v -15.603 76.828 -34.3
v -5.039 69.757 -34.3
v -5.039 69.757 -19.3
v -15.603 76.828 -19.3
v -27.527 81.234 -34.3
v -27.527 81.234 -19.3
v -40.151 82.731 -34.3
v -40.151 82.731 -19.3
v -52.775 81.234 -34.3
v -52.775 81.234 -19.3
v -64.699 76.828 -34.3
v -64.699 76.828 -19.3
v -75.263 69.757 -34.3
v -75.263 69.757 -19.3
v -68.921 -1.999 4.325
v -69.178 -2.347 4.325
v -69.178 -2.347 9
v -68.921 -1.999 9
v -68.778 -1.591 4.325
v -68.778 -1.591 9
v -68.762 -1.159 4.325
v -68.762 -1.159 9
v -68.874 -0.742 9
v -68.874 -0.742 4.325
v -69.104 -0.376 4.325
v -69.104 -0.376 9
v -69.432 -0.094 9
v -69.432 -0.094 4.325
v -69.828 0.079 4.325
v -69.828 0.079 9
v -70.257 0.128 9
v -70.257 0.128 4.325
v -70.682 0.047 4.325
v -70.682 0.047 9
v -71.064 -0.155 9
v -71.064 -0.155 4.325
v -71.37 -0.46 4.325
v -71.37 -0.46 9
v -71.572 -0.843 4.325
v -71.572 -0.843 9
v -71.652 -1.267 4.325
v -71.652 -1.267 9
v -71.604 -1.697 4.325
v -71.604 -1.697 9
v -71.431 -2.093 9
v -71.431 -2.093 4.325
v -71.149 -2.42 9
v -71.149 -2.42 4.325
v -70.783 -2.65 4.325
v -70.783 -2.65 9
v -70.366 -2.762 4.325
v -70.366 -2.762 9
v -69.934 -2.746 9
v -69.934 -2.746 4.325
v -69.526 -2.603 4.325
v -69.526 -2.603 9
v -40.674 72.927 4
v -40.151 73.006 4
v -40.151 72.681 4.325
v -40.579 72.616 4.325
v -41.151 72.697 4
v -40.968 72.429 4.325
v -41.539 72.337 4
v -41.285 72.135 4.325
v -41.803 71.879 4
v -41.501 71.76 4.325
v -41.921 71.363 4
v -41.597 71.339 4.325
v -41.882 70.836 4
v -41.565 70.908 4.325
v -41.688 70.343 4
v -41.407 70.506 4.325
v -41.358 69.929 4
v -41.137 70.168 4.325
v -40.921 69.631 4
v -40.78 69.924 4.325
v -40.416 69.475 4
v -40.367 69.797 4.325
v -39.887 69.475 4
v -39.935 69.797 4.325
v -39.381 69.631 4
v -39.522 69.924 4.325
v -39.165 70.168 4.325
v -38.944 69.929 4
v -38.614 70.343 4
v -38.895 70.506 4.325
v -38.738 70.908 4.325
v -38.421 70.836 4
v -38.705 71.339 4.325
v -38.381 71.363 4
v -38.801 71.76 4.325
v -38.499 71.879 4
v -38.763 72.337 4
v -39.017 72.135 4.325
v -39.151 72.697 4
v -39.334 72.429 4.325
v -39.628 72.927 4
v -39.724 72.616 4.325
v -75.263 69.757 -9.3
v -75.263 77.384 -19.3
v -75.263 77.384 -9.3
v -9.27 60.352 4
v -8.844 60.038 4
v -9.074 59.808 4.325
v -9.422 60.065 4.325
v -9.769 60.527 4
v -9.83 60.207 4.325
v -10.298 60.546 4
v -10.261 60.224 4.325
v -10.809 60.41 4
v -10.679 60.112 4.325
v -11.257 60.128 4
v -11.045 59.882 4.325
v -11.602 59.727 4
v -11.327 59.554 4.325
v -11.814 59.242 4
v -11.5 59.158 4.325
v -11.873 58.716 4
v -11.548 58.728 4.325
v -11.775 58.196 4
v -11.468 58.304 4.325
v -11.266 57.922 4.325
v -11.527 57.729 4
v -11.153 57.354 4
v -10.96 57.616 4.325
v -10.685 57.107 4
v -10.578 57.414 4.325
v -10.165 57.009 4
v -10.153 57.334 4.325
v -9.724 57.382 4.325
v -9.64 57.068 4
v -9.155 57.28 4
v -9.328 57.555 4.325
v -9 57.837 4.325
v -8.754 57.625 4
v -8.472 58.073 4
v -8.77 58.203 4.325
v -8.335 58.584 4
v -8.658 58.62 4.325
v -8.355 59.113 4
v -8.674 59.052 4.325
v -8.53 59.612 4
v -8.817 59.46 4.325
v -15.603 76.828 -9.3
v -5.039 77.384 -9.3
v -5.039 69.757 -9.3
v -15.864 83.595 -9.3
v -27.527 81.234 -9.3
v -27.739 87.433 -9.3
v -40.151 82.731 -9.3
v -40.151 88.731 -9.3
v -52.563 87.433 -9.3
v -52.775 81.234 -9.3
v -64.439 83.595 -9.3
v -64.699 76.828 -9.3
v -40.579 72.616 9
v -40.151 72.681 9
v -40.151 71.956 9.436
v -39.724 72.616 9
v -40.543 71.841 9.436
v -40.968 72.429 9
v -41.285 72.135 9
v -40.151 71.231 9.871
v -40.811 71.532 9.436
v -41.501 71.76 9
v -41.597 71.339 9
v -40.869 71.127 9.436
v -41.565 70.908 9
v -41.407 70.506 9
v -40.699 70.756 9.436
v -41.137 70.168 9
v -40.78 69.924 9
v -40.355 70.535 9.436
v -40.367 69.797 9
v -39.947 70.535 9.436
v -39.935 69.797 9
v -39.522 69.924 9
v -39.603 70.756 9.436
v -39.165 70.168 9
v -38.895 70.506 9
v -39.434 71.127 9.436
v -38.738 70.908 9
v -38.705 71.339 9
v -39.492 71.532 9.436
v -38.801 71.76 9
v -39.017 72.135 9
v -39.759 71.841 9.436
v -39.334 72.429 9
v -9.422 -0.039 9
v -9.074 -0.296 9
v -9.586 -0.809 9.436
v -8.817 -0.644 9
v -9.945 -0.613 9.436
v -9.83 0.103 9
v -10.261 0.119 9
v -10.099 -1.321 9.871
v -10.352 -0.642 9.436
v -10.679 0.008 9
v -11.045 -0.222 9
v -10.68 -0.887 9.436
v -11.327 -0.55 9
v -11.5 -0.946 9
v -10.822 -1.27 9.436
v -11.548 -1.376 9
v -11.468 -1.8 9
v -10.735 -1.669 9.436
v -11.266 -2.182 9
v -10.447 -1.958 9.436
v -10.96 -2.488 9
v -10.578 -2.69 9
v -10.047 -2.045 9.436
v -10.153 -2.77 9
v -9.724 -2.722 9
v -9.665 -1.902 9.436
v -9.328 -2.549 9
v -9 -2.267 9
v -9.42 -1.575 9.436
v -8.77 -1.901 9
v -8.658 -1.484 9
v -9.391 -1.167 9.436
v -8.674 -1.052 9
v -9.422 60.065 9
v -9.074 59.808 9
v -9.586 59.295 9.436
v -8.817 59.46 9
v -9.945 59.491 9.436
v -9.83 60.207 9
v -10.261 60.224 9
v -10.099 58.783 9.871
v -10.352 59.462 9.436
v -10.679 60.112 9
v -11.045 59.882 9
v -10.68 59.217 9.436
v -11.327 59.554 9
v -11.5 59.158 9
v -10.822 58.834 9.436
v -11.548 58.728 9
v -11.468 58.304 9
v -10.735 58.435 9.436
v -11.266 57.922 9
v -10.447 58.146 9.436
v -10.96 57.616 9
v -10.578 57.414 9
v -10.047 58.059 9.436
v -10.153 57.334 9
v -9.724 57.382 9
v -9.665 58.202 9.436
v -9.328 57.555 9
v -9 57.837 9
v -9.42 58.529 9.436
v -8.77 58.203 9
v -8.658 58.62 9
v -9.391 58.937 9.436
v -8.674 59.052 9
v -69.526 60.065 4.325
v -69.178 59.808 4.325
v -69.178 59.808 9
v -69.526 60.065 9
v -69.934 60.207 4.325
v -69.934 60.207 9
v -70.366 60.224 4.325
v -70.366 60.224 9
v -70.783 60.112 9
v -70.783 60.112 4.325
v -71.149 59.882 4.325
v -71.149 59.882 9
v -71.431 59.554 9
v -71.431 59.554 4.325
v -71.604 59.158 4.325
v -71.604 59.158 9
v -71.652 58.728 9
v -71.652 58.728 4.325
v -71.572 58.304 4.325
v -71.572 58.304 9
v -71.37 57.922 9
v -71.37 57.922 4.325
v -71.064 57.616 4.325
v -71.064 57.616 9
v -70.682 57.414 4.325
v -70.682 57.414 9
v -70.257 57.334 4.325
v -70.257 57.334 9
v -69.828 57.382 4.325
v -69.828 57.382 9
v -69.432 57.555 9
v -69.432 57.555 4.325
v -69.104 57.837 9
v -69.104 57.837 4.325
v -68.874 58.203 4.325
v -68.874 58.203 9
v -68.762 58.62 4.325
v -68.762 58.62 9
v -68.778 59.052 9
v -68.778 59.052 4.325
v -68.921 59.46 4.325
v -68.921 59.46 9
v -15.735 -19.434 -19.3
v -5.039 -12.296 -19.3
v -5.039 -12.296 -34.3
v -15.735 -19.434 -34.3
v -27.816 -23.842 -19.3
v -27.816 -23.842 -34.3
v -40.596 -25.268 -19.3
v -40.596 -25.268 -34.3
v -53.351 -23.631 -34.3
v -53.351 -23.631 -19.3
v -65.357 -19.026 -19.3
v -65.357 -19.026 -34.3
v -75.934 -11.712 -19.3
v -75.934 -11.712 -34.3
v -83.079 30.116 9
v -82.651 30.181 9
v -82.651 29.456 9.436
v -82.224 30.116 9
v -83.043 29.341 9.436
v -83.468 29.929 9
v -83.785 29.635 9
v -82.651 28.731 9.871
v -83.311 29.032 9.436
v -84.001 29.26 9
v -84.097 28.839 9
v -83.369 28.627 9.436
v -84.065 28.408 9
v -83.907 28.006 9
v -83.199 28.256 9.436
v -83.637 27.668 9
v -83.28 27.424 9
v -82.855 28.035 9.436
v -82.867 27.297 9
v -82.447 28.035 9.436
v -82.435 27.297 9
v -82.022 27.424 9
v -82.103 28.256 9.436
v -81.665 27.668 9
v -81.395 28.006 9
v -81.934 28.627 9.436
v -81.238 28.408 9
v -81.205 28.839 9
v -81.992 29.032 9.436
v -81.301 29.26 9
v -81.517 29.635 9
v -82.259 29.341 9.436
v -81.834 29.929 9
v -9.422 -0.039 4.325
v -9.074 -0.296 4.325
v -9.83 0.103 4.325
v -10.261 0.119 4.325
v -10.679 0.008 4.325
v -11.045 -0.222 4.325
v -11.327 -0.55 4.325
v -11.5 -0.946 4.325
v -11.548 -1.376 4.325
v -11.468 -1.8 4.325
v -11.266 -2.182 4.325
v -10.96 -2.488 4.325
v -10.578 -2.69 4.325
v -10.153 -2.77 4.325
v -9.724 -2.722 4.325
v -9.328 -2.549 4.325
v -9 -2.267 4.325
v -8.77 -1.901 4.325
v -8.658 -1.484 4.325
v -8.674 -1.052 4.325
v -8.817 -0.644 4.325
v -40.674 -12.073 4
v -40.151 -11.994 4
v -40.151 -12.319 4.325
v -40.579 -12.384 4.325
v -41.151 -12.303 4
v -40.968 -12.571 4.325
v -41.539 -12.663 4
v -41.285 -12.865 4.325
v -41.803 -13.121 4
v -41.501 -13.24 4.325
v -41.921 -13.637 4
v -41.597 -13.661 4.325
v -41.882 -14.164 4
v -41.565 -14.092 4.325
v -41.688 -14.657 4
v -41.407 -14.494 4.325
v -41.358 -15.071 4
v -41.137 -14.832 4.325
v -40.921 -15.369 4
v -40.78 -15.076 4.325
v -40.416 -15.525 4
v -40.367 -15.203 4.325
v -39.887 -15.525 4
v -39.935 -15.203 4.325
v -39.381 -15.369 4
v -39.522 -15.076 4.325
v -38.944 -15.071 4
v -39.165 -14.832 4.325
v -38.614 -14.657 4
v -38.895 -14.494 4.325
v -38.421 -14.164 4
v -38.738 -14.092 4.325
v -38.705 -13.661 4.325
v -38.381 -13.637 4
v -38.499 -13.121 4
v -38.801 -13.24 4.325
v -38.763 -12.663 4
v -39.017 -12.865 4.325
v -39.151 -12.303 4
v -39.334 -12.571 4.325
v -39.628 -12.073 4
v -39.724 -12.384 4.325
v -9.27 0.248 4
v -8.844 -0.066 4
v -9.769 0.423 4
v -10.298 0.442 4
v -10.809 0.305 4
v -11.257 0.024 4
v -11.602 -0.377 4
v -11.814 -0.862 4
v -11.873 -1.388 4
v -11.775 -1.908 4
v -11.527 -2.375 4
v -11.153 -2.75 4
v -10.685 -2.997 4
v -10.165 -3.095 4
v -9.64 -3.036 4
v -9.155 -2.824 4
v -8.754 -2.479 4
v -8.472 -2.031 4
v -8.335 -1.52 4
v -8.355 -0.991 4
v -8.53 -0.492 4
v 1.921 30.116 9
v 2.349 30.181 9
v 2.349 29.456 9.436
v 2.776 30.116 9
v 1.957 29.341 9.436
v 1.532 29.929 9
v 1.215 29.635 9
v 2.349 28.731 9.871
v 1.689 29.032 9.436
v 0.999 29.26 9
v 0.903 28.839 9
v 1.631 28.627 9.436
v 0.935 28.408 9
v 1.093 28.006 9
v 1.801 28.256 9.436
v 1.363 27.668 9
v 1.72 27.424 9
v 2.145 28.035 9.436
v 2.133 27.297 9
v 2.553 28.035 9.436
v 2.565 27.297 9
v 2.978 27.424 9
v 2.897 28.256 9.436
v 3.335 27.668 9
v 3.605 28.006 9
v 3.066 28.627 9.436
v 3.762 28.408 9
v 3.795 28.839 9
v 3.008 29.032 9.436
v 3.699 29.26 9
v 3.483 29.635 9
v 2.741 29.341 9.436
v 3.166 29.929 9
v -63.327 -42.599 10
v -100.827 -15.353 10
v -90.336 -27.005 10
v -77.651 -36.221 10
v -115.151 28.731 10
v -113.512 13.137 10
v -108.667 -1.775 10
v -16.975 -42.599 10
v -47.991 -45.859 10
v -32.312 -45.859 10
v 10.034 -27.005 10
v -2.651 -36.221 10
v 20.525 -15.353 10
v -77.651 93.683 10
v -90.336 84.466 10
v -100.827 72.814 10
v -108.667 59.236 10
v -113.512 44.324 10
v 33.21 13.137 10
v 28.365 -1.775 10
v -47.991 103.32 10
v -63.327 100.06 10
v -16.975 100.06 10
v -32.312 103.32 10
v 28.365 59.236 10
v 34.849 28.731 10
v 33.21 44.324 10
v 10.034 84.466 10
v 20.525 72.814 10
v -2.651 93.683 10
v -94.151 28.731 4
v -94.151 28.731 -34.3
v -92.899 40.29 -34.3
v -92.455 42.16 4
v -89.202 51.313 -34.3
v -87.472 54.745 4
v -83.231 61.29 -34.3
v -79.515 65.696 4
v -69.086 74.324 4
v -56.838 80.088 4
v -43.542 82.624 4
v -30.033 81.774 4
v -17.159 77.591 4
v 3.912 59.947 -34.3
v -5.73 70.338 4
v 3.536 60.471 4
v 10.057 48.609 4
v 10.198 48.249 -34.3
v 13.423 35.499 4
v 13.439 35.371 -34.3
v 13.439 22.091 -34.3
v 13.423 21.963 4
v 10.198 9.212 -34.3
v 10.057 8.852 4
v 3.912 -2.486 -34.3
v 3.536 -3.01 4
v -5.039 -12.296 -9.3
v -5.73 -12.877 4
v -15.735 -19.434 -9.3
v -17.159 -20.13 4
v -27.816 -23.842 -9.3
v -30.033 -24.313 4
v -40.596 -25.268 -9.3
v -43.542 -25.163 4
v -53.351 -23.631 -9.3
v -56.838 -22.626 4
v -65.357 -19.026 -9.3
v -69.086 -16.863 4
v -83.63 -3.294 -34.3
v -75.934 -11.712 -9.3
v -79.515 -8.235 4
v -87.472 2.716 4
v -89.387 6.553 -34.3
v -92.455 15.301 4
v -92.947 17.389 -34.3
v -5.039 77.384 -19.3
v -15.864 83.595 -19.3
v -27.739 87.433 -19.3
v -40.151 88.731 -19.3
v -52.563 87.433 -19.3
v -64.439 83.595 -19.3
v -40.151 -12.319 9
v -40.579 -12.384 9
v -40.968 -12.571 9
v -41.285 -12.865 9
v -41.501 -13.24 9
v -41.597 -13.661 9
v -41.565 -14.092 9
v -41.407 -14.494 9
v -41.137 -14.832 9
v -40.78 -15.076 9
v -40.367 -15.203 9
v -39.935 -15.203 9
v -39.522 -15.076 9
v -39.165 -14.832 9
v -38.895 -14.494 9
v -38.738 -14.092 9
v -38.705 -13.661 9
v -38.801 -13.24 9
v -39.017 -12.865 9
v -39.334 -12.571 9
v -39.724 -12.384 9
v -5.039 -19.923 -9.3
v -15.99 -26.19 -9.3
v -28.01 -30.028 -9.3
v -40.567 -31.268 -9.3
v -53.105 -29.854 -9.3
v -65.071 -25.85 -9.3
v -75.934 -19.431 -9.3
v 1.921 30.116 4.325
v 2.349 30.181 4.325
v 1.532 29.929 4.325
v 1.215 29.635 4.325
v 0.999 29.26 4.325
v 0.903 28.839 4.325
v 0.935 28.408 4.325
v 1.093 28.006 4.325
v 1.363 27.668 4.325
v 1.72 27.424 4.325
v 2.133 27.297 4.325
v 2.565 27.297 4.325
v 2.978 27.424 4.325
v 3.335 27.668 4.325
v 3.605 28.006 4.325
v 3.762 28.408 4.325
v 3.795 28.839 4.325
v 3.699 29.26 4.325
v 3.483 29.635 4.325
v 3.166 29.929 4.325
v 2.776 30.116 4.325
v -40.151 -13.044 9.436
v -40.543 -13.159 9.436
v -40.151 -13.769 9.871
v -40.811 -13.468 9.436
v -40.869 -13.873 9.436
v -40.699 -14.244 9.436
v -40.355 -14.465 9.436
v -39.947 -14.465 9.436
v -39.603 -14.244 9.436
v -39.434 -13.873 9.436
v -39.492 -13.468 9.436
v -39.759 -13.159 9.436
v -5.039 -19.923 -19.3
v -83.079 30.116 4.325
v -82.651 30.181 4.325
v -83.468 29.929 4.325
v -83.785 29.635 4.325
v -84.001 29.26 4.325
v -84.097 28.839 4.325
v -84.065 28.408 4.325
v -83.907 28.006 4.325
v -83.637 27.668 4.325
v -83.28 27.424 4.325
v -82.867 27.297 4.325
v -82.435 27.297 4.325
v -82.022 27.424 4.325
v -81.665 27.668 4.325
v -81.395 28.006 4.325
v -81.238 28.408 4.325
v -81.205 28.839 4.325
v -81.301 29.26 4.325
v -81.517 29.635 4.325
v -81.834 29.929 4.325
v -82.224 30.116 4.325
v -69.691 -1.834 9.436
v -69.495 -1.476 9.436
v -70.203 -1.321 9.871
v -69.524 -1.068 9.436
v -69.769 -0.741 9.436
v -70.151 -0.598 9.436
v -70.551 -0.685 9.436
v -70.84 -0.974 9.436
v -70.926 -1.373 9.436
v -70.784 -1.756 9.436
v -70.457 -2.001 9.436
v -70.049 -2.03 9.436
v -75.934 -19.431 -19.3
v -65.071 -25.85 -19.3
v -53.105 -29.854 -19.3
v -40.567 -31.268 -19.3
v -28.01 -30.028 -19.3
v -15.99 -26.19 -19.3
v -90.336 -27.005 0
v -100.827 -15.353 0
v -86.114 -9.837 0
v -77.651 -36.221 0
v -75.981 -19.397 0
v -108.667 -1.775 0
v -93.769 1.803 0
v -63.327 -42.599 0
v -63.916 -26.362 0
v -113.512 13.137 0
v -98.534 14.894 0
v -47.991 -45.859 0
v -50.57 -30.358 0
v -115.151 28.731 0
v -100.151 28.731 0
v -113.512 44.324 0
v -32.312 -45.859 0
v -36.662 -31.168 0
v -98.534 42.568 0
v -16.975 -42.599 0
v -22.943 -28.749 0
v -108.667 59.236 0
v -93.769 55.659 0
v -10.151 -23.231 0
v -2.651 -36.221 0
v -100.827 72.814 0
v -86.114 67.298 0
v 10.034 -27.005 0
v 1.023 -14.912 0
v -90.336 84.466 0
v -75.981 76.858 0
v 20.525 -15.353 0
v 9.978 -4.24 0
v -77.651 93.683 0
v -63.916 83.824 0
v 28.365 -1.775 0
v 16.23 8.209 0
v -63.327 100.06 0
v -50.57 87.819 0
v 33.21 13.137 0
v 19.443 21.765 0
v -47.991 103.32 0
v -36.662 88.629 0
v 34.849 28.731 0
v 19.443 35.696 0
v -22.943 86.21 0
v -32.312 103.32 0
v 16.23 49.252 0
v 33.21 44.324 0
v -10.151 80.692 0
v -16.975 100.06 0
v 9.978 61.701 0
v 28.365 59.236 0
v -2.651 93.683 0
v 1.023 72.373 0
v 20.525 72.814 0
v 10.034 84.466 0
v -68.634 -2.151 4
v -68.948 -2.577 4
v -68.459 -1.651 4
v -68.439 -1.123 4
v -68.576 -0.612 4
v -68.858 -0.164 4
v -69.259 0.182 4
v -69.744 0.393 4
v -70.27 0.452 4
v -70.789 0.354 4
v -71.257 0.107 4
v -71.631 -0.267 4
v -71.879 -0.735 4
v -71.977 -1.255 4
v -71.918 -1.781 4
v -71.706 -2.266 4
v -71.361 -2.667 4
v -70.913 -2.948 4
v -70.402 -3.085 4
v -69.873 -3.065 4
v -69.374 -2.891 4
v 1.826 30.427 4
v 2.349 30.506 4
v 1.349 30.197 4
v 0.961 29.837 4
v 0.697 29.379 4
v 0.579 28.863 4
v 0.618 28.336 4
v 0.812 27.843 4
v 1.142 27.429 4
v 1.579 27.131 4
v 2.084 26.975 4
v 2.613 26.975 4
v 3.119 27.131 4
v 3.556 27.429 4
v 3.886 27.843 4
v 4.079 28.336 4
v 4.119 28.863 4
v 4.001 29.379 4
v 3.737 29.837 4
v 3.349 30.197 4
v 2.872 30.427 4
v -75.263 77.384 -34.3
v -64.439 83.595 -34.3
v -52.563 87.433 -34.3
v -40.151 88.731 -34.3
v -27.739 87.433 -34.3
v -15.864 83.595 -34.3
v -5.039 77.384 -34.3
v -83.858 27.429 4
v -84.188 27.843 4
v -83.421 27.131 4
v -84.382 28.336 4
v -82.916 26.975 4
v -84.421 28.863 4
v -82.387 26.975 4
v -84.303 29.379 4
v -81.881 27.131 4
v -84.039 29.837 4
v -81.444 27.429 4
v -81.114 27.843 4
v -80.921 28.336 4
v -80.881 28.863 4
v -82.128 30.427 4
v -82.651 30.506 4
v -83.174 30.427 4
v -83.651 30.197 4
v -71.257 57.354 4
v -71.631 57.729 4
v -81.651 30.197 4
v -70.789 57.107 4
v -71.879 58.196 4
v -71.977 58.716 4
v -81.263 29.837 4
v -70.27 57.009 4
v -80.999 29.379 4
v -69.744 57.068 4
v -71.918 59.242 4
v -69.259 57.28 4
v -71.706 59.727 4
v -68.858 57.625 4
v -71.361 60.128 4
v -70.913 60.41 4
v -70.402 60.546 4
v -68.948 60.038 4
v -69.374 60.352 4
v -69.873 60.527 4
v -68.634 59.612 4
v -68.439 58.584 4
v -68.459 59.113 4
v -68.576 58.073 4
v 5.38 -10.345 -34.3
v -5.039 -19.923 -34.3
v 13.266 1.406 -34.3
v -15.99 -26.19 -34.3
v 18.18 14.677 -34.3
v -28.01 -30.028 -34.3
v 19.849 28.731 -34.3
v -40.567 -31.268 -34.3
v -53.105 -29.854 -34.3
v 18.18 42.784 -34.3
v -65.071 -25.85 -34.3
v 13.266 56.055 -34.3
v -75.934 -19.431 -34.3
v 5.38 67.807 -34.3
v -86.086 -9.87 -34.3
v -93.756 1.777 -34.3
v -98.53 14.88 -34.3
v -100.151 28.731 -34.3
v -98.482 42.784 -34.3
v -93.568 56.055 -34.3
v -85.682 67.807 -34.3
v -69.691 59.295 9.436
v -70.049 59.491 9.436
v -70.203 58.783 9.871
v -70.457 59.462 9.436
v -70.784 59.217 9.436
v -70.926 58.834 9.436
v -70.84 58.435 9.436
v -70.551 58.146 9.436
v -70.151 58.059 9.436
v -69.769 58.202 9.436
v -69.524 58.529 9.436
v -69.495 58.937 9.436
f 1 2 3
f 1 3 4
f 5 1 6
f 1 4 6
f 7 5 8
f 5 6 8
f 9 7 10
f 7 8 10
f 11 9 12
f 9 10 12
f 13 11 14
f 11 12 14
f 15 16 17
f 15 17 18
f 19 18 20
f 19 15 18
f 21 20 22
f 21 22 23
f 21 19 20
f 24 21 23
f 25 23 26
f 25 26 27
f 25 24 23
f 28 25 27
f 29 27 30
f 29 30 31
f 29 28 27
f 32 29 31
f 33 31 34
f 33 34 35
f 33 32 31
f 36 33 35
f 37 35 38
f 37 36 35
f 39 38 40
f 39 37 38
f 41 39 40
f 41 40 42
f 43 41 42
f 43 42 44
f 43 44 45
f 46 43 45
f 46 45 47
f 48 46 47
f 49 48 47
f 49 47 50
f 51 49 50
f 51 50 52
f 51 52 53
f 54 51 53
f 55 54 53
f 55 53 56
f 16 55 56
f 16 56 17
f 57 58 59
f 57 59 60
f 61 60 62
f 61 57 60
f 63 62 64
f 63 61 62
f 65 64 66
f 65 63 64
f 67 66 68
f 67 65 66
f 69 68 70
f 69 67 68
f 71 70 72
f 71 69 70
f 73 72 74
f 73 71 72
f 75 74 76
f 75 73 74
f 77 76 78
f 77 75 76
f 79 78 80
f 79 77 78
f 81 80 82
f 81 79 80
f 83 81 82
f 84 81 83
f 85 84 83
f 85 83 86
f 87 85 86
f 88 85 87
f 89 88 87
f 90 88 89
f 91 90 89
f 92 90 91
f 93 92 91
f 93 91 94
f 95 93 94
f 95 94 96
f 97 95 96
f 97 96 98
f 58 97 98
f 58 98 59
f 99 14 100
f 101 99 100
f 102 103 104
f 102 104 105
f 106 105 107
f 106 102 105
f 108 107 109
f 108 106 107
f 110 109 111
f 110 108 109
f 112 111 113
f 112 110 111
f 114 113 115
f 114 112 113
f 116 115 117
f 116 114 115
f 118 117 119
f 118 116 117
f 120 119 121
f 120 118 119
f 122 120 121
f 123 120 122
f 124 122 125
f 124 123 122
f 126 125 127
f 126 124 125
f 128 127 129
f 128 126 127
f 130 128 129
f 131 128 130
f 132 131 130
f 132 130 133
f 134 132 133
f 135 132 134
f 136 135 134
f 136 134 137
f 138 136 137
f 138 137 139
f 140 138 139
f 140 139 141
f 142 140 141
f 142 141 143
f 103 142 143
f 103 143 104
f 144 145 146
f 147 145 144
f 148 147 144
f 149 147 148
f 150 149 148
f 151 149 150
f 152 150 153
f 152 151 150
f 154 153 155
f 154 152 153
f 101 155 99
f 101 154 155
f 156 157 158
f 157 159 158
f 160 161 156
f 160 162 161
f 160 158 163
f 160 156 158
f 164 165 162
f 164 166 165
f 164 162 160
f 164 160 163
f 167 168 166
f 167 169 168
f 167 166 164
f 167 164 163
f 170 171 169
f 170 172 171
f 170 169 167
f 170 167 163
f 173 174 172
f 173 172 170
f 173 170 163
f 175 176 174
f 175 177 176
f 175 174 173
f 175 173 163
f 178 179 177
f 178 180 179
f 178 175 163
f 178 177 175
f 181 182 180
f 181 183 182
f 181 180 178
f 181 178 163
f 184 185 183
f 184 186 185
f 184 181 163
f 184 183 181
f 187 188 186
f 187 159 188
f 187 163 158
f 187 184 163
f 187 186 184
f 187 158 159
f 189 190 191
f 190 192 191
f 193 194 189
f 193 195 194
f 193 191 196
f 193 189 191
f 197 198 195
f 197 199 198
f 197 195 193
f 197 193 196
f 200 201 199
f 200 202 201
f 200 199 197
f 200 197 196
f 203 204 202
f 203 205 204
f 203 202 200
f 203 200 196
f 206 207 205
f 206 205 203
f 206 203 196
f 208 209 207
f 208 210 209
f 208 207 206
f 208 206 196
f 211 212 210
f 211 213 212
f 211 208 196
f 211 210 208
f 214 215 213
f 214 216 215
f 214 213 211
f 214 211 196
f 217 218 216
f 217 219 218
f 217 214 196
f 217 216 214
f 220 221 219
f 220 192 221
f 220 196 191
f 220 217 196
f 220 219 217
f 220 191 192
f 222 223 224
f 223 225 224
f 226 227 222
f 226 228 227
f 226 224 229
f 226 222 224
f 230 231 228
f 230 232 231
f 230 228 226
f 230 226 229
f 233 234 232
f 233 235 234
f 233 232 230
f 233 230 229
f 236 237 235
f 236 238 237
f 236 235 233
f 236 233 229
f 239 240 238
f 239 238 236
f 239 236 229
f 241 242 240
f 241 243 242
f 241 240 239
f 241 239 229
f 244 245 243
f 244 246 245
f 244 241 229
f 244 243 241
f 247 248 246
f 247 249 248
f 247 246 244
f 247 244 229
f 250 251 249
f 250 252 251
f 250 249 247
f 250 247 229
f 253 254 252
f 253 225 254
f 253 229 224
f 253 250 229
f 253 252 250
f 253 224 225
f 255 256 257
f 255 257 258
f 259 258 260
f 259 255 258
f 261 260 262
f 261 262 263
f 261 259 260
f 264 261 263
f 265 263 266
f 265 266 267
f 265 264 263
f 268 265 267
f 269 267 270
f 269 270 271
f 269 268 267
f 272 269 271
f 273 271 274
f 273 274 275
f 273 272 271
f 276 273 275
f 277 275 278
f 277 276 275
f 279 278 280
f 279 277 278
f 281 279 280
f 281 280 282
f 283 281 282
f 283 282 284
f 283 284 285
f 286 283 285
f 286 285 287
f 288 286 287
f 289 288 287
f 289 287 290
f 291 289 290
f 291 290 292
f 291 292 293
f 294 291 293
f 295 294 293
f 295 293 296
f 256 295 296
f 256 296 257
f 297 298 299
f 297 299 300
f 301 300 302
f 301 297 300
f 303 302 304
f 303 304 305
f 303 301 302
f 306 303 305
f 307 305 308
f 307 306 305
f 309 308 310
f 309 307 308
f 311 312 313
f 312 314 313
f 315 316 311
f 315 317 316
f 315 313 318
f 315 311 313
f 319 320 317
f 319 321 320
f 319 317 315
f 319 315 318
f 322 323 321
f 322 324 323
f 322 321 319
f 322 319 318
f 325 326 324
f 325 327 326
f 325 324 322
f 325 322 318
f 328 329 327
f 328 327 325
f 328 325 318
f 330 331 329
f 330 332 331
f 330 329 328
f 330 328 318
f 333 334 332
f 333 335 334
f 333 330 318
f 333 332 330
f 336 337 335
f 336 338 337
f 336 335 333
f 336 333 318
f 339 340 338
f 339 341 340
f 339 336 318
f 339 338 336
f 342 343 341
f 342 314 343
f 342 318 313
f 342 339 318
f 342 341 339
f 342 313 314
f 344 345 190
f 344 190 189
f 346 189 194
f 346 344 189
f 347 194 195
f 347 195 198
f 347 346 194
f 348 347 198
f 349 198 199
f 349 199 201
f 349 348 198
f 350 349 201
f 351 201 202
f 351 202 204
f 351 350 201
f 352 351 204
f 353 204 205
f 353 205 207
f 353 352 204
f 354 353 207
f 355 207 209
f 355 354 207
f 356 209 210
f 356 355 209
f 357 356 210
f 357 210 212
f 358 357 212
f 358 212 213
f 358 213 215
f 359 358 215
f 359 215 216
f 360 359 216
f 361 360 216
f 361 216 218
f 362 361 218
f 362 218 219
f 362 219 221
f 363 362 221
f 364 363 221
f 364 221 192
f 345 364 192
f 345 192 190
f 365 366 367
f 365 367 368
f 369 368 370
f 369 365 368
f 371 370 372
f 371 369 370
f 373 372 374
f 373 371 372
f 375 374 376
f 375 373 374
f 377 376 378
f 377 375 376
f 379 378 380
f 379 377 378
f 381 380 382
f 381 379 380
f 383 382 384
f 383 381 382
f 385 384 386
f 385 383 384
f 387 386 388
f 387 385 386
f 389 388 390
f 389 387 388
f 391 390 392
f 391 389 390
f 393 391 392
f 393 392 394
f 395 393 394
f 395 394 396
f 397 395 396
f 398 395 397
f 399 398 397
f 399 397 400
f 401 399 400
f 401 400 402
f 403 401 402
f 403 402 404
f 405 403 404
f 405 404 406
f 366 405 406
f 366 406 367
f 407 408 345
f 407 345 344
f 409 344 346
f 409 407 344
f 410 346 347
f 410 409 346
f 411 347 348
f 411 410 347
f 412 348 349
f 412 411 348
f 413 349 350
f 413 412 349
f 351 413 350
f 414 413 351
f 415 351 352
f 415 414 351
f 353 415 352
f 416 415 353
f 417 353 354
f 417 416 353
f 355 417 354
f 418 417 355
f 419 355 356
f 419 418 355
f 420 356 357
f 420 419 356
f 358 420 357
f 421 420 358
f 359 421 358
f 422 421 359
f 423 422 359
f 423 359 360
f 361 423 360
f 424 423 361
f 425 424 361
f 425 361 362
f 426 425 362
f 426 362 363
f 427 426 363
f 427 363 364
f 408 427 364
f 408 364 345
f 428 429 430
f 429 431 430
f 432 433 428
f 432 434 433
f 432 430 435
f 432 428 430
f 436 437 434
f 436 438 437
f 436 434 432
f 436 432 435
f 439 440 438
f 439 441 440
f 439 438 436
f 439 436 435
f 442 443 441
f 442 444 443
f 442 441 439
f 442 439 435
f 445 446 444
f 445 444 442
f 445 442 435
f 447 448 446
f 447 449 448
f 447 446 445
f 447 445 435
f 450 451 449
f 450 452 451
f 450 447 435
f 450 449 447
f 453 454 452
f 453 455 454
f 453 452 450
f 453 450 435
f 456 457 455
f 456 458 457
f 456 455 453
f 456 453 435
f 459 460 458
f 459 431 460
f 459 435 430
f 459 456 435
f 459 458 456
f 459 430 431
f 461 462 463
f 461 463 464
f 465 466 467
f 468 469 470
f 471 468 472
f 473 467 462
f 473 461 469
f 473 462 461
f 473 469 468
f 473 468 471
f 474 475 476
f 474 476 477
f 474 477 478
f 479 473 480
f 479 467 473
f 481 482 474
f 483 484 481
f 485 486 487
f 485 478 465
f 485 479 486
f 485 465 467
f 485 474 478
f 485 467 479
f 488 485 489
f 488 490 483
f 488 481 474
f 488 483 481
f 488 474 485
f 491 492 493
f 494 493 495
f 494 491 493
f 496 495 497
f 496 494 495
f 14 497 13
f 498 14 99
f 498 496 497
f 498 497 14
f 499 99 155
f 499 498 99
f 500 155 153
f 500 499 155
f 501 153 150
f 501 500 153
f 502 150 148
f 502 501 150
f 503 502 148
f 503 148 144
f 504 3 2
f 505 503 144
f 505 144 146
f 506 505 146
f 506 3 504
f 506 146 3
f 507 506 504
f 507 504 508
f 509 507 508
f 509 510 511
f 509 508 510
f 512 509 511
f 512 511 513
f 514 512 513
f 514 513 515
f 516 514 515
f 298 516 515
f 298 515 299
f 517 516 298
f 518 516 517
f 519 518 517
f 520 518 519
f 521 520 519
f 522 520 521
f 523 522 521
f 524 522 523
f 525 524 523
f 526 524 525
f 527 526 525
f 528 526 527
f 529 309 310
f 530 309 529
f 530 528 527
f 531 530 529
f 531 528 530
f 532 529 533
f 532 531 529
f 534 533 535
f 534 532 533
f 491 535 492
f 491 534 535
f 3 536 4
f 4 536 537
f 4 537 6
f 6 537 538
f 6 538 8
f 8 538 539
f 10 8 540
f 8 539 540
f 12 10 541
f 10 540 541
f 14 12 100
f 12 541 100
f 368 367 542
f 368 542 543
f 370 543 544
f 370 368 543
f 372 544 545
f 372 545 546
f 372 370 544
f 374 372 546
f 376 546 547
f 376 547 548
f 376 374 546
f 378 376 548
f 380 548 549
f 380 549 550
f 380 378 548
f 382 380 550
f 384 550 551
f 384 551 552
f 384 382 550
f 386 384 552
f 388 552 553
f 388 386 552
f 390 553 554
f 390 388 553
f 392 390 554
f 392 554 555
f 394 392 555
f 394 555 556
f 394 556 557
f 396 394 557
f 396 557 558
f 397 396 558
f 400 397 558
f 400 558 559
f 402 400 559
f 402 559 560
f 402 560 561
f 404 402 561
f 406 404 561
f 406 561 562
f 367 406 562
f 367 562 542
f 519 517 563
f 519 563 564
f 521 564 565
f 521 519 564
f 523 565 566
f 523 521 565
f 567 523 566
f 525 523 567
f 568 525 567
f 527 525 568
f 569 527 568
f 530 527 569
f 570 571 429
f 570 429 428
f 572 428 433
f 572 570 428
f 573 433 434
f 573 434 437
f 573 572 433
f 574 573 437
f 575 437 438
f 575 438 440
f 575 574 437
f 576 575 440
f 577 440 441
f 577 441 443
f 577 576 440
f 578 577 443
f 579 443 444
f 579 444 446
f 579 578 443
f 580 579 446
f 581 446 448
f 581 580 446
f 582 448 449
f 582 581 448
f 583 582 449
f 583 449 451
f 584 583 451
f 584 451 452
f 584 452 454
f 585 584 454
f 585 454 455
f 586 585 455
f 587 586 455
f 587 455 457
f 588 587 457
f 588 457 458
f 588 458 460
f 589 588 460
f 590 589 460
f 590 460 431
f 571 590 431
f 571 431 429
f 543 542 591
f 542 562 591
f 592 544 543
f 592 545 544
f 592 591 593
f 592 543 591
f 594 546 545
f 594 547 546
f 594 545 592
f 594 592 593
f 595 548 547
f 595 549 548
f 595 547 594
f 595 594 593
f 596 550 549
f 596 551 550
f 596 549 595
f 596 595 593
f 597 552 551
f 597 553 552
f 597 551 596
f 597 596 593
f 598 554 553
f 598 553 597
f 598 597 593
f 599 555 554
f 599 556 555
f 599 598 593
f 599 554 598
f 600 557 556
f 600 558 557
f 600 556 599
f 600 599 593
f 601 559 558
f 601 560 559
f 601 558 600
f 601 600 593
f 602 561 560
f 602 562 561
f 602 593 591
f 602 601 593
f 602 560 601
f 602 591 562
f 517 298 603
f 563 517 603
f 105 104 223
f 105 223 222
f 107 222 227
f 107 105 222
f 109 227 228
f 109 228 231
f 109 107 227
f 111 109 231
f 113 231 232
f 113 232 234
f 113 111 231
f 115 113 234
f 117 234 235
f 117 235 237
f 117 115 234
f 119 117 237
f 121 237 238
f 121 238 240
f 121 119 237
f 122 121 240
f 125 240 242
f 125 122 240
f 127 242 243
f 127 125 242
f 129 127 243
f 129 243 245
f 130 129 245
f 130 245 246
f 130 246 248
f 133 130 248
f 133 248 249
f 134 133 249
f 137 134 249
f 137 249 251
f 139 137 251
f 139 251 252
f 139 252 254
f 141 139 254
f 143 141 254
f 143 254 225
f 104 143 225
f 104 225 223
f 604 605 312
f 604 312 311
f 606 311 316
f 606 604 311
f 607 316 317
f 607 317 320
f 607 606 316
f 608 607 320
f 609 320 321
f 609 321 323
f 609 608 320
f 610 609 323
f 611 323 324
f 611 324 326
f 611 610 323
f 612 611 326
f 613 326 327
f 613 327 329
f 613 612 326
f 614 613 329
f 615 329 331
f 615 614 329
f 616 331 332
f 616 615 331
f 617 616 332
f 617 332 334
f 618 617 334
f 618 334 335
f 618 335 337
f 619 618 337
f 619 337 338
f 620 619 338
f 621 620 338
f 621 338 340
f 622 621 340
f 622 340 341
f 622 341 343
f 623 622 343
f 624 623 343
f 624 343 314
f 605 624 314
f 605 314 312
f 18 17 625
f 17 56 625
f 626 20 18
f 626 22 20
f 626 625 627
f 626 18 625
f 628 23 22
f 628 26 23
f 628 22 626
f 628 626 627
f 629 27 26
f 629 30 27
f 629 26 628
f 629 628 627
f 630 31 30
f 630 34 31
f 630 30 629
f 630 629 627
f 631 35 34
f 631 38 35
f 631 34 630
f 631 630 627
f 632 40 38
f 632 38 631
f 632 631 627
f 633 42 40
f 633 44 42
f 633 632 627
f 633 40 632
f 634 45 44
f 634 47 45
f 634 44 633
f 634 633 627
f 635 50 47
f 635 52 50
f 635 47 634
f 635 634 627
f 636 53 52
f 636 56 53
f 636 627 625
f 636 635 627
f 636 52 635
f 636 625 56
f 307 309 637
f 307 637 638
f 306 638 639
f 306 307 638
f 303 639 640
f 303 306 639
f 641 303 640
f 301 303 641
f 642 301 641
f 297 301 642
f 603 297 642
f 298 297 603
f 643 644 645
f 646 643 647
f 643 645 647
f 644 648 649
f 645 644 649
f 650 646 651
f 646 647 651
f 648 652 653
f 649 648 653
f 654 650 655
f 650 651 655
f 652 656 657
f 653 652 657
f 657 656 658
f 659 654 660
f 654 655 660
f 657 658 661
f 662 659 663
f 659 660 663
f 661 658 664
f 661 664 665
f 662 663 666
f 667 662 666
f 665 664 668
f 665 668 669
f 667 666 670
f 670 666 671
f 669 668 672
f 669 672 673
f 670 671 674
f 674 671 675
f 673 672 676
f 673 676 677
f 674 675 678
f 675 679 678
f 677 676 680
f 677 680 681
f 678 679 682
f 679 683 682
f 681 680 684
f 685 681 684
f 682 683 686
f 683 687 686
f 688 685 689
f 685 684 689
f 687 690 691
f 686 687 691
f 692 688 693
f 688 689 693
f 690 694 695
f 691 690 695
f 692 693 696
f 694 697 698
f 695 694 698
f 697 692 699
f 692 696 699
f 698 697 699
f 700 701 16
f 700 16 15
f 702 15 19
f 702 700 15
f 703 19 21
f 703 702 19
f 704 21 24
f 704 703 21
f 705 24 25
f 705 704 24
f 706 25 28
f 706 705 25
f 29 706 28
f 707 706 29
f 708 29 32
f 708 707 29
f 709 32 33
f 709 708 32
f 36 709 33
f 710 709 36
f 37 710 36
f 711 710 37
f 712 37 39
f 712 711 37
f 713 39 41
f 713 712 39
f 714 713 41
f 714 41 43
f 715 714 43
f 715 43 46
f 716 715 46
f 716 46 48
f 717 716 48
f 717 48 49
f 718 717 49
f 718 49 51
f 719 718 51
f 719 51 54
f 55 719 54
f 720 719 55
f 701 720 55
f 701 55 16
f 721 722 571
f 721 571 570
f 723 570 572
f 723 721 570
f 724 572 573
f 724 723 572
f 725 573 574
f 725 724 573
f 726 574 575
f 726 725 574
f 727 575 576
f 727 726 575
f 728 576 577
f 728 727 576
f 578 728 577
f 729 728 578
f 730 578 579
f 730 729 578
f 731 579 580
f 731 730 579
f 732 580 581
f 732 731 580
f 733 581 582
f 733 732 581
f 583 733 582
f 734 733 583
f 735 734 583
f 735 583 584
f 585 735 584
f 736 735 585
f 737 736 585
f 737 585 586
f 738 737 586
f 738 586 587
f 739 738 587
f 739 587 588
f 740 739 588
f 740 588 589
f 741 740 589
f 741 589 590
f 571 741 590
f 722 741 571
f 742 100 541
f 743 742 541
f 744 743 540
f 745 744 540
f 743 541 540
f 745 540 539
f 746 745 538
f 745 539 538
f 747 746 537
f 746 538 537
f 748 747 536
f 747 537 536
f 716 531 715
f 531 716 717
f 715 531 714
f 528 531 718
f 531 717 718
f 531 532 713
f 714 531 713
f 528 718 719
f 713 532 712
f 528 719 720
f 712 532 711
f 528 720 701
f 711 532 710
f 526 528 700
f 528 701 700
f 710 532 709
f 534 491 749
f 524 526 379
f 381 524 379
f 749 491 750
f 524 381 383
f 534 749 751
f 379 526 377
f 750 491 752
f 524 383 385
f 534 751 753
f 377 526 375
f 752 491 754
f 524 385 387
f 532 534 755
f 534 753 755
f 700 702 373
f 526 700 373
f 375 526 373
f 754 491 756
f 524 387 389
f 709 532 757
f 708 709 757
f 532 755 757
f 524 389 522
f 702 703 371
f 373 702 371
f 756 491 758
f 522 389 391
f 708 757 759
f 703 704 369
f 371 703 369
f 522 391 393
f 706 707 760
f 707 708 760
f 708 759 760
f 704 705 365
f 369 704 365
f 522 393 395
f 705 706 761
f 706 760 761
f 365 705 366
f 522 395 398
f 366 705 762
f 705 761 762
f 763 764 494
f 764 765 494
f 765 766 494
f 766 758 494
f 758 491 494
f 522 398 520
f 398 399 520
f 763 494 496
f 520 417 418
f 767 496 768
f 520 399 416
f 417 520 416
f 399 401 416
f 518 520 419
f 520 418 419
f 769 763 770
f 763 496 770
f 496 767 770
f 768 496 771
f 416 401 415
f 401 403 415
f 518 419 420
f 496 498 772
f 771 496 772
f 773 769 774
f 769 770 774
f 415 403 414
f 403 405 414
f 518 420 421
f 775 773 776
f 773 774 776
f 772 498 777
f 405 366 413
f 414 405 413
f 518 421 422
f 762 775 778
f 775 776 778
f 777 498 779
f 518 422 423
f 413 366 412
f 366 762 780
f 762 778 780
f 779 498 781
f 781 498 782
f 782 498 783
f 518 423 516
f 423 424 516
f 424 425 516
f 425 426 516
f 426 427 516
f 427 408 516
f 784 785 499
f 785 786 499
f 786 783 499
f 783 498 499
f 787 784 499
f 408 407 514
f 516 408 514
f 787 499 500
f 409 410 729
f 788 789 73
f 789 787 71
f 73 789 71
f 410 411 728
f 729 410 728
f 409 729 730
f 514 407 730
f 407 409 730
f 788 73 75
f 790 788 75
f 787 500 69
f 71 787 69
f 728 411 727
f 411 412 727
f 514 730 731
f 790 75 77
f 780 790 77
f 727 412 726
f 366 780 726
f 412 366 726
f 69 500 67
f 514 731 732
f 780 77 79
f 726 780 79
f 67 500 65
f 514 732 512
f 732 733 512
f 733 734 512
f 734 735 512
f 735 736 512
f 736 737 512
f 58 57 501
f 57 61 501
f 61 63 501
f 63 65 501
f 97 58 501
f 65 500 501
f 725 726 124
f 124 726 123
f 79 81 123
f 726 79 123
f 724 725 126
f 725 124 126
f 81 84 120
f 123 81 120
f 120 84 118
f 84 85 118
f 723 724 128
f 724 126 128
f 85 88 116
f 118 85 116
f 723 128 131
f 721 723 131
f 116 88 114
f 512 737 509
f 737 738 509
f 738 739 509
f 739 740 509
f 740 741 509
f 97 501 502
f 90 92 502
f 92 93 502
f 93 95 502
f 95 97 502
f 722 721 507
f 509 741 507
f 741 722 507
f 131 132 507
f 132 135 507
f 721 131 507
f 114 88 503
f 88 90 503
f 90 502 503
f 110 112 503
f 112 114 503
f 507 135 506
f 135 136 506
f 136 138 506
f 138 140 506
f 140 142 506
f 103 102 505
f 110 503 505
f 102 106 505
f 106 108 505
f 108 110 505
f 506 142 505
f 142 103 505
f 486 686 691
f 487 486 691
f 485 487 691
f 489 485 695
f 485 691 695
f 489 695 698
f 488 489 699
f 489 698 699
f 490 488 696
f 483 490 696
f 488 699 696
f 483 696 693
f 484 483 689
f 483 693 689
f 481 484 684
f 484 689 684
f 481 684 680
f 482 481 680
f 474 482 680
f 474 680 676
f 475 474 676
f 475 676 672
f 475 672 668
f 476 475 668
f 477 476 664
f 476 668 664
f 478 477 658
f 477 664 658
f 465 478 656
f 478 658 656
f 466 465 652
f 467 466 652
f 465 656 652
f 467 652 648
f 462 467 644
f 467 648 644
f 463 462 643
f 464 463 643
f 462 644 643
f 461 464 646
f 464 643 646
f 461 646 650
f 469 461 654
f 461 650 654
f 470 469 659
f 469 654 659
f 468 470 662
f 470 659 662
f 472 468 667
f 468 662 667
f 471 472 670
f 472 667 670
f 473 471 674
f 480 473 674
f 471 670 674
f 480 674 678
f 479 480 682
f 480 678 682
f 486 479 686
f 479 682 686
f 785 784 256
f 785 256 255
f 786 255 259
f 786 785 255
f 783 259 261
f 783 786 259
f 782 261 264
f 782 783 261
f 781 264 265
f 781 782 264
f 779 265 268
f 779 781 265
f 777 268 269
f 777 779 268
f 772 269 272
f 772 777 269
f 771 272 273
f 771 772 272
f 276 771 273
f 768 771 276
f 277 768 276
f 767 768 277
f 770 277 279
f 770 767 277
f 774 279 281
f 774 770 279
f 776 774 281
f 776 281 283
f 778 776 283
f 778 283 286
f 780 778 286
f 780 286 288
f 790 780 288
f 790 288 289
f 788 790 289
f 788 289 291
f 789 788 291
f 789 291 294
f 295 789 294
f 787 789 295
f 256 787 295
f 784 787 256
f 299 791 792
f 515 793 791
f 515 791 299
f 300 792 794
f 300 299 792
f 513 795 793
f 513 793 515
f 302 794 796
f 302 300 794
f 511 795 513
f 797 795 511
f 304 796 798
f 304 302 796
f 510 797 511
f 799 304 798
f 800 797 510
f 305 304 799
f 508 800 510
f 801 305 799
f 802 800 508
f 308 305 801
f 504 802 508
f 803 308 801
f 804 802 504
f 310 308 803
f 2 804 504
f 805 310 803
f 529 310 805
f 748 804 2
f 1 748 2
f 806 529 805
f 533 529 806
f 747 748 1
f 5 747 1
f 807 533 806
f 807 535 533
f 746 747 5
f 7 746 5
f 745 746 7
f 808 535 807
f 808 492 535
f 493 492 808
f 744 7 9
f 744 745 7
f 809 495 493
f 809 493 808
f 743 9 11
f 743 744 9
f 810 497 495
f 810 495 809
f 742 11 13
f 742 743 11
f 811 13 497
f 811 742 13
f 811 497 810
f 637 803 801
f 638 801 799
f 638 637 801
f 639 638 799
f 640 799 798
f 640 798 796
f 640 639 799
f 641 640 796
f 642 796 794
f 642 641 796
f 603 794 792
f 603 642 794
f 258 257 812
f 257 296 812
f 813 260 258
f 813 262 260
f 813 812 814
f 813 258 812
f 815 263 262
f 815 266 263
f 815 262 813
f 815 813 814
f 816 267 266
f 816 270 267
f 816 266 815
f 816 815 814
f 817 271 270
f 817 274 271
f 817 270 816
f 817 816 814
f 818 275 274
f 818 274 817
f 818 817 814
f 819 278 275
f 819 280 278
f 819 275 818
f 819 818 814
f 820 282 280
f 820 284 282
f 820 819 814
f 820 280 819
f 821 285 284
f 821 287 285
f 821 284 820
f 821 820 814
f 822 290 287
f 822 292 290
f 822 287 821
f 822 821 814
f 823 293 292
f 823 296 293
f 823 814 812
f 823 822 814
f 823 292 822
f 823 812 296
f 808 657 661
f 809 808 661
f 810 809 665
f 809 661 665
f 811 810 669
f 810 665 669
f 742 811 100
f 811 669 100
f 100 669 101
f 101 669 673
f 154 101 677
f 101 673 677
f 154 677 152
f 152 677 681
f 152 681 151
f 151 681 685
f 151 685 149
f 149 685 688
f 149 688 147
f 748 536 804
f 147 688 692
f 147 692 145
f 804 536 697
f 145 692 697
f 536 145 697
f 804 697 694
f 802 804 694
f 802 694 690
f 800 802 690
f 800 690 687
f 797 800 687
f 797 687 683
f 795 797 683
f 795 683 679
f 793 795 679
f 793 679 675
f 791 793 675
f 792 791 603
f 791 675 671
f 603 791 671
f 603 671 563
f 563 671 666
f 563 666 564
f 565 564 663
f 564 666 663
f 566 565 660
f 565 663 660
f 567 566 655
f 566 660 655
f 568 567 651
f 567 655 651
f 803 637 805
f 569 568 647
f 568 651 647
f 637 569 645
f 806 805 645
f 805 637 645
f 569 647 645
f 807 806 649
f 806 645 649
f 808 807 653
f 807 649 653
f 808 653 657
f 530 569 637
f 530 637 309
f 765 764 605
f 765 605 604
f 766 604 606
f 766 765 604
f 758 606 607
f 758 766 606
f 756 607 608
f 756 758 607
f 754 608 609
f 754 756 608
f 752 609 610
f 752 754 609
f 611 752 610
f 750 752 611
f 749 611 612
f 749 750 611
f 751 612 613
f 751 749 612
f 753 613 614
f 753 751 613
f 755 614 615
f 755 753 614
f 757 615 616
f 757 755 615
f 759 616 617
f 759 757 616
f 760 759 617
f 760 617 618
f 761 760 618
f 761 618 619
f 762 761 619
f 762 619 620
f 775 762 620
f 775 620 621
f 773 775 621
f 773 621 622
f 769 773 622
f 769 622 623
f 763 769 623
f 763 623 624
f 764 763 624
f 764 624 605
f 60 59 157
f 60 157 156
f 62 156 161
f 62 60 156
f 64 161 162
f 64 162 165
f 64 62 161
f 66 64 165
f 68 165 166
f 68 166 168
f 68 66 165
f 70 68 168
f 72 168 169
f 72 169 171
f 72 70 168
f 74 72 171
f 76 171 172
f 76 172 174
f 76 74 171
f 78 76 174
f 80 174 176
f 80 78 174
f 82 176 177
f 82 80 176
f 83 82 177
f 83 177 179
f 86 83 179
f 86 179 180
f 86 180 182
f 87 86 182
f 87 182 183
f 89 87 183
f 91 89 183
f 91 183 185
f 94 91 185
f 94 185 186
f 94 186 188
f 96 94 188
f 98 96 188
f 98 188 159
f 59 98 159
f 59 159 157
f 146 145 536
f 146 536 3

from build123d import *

# Parameters (mm, degrees)
SKETCH_2_R                    = 75
EXTRUDE_1_DEPTH               = 10
SKETCH_3_R                    = 60
EXTRUDE_3_DEPTH               = 34.3
SHELL_2_T                     = -6
CUT_EXTRUDE_START             = -25
CUT_EXTRUDE_2_DEPTH           = 25
EXTRUDE_START                 = -15
EXTRUDE_4_DEPTH               = 15
HOLE_WIZARD_M3_5_1_AT_2_COUNT = 2
HOLE_WIZARD_M3_5_1_AT_2_PITCH = 60.104076401
HOLE_WIZARD_M3_5_1_AT_3_COUNT = 2
HOLE_WIZARD_M3_5_1_AT_3_PITCH = 85
HOLE_WIZARD_M3_5_1_AT_4_COUNT = 2
HOLE_WIZARD_M3_5_1_AT_4_PITCH = 60.104076401
PATTERN_CIRCULAR_1_COUNT      = 4
PATTERN_CIRCULAR_1_ANGLE      = 135


with BuildPart() as part:
    # 草图2 → 凸台-拉伸1 (new body)
    with BuildSketch(Plane.XY):
        with Locations((-40.151148837, 28.730605226)):
            Circle(SKETCH_2_R)
    extrude(amount=EXTRUDE_1_DEPTH)

    # 草图3 → 凸台-拉伸3 (add)
    with BuildSketch(Plane(origin=(0, 0, 0), x_dir=(-1, 0, 0), z_dir=(0, 0, -1))):
        with Locations((40.151148837, 28.730605226)):
            Circle(SKETCH_3_R)
    extrude(amount=EXTRUDE_3_DEPTH)

    # 抽壳2
    shell_2_openings = [part.faces().sort_by_distance(p)[0] for p in [
        (-40.151148837, 28.730605226, -34.3),
    ]]
    offset(amount=SHELL_2_T, openings=shell_2_openings, kind=Kind.INTERSECTION)

    # 草图5 → 切除-拉伸2 (cut)
    with BuildSketch(Plane(origin=(0, 0, -34.3), x_dir=(-1, 0, 0), z_dir=(0, 0, -1)).offset(CUT_EXTRUDE_START)):
        with BuildLine():
            ThreePointArc((75.263111693, 77.38397165), (40.151148837, 88.730605226), (5.039185981, 77.38397165))
            Line((5.039185981, 77.38397165), (5.039185981, 69.756817145))
            ThreePointArc((5.039185981, 69.756817145), (40.151148837, 82.730605226), (75.263111693, 69.756817145))
            Line((75.263111693, 69.756817145), (75.263111693, 77.38397165))
        make_face()
        with BuildLine():
            Line((5.039185981, -12.295606692), (5.039185981, -19.922761198))
            ThreePointArc((5.039185981, -19.922761198), (40.567011683, -31.267953574), (75.934159557, -19.43137297))
            Line((75.934159557, -19.43137297), (75.934159557, -11.711651681))
            ThreePointArc((75.934159557, -11.711651681), (40.595926503, -25.26756301), (5.039185981, -12.295606692))
        make_face()
    extrude(amount=CUT_EXTRUDE_2_DEPTH, mode=Mode.SUBTRACT)

    # 草图6 → 凸台-拉伸4 (add)
    with BuildSketch(Plane(origin=(0, 0, -34.3), x_dir=(-1, 0, 0), z_dir=(0, 0, -1)).offset(EXTRUDE_START)):
        with BuildLine():
            Line((5.039185981, 77.38397165), (5.039185981, 69.756817145))
            ThreePointArc((5.039185981, 69.756817145), (40.151148837, 82.730605226), (75.263111693, 69.756817145))
            Line((75.263111693, 69.756817145), (75.263111693, 77.38397165))
            ThreePointArc((75.263111693, 77.38397165), (40.151148837, 88.730605226), (5.039185981, 77.38397165))
        make_face()
        with BuildLine():
            Line((75.934159557, -11.711651681), (75.934159557, -19.43137297))
            ThreePointArc((75.934159557, -19.43137297), (40.567011683, -31.267953574), (5.039185981, -19.922761198))
            Line((5.039185981, -19.922761198), (5.039185981, -12.295606692))
            ThreePointArc((5.039185981, -12.295606692), (40.595926503, -25.26756301), (75.934159557, -11.711651681))
        make_face()
    extrude(amount=EXTRUDE_4_DEPTH)

    # 草图10 → M3.5 螺纹孔1 (revolve, cut)
    with BuildSketch(Plane(origin=(2.348851163, 28.730605226, 4), x_dir=(0, 1, 0), z_dir=(1, 0, 0))):
        Polygon((0, 0), (0, 5.871247898), (1.45, 5), (1.45, 0.325), (1.775, 0), align=None)
    hole_wizard_m3_5_1 = revolve(axis=Axis((2.348851163, 28.730605226, -2.35), (0, 0, 1)), mode=Mode.SUBTRACT)

    # M3.5 螺纹孔1 at 2: M3.5 螺纹孔1 ×2
    with Locations(*[Vector(-0.7071067811865475, 0.7071067811865476, 0) * (i * HOLE_WIZARD_M3_5_1_AT_2_PITCH) for i in range(1, HOLE_WIZARD_M3_5_1_AT_2_COUNT)]):
        add(hole_wizard_m3_5_1, mode=Mode.SUBTRACT)

    # M3.5 螺纹孔1 at 3: M3.5 螺纹孔1 ×2
    with Locations(*[(-i * HOLE_WIZARD_M3_5_1_AT_3_PITCH, 0, 0) for i in range(1, HOLE_WIZARD_M3_5_1_AT_3_COUNT)]):
        add(hole_wizard_m3_5_1, mode=Mode.SUBTRACT)

    # M3.5 螺纹孔1 at 4: M3.5 螺纹孔1 ×2
    with Locations(*[Vector(-0.7071067811865476, -0.7071067811865476, 0) * (i * HOLE_WIZARD_M3_5_1_AT_4_PITCH) for i in range(1, HOLE_WIZARD_M3_5_1_AT_4_COUNT)]):
        add(hole_wizard_m3_5_1, mode=Mode.SUBTRACT)

    # 阵列(圆周)1: M3.5 螺纹孔1 ×4 about axis
    pattern_circular_1_axis = Axis((-40.151148837, 28.730605226, 0), (0, 0, -1))
    for i in range(1, PATTERN_CIRCULAR_1_COUNT):
        add(hole_wizard_m3_5_1.rotate(pattern_circular_1_axis, i * PATTERN_CIRCULAR_1_ANGLE / (PATTERN_CIRCULAR_1_COUNT - 1)), mode=Mode.SUBTRACT)

    # 阵列(圆周)1 copy 1 sketch → 阵列(圆周)1 copy 1 (revolve, cut)
    with BuildSketch(Plane(origin=(-10.099110636, 58.782643427, 4), x_dir=(0.7071067811865487, 0.7071067811865464, 0), z_dir=(0.7071067811865464, -0.7071067811865487, 0))):
        Polygon((0, 0), (0, 5.871247898), (1.45, 5), (1.45, 0.325), (1.775, 0), align=None)
    revolve(axis=Axis((-10.099110636, 58.782643427, -2.35), (0, 0, 1)), mode=Mode.SUBTRACT)

    # 阵列(圆周)1 copy 2 sketch → 阵列(圆周)1 copy 2 (revolve, cut)
    with BuildSketch(Plane(origin=(2.348851163, 28.730605226, 4), x_dir=(1, 0, 0), z_dir=(0, -1, 0))):
        Polygon((0, 0), (0, 5.871247898), (1.45, 5), (1.45, 0.325), (1.775, 0), align=None)
    revolve(axis=Axis((2.348851163, 28.730605226, -2.35), (0, 0, 1)), mode=Mode.SUBTRACT)

    # 阵列(圆周)1 copy 3 sketch → 阵列(圆周)1 copy 3 (revolve, cut)
    with BuildSketch(Plane(origin=(-10.099110636, -1.321432974, 4), x_dir=(0.7071067811865441, -0.7071067811865509, 0), z_dir=(-0.7071067811865509, -0.7071067811865441, 0))):
        Polygon((0, 0), (0, 5.871247898), (1.45, 5), (1.45, 0.325), (1.775, 0), align=None)
    revolve(axis=Axis((-10.099110636, -1.321432974, -2.35), (0, 0, 1)), mode=Mode.SUBTRACT)

    # 阵列(圆周)1 copy 4 sketch → 阵列(圆周)1 copy 4 (revolve, cut)
    with BuildSketch(Plane(origin=(-70.203187037, 58.782643427, 4), x_dir=(0.7071067811865487, 0.7071067811865464, 0), z_dir=(0.7071067811865464, -0.7071067811865487, 0))):
        Polygon((0, 0), (0, 5.871247898), (1.45, 5), (1.45, 0.325), (1.775, 0), align=None)
    revolve(axis=Axis((-70.203187037, 58.782643427, -2.35), (0, 0, 1)), mode=Mode.SUBTRACT)

    # 阵列(圆周)1 copy 5 sketch → 阵列(圆周)1 copy 5 (revolve, cut)
    with BuildSketch(Plane(origin=(-40.151148837, 71.230605226, 4), x_dir=(1, 0, 0), z_dir=(0, -1, 0))):
        Polygon((0, 0), (0, 5.871247898), (1.45, 5), (1.45, 0.325), (1.775, 0), align=None)
    revolve(axis=Axis((-40.151148837, 71.230605226, -2.35), (0, 0, 1)), mode=Mode.SUBTRACT)

    # 阵列(圆周)1 copy 6 sketch → 阵列(圆周)1 copy 6 (revolve, cut)
    with BuildSketch(Plane(origin=(-10.099110636, 58.782643427, 4), x_dir=(0.7071067811865441, -0.7071067811865509, 0), z_dir=(-0.7071067811865509, -0.7071067811865441, 0))):
        Polygon((0, 0), (0, 5.871247898), (1.45, 5), (1.45, 0.325), (1.775, 0), align=None)
    revolve(axis=Axis((-10.099110636, 58.782643427, -2.35), (0, 0, 1)), mode=Mode.SUBTRACT)

    # 阵列(圆周)1 copy 7 sketch → 阵列(圆周)1 copy 7 (revolve, cut)
    with BuildSketch(Plane(origin=(-70.203187037, -1.321432974, 4), x_dir=(0.7071067811865487, 0.7071067811865464, 0), z_dir=(0.7071067811865464, -0.7071067811865487, 0))):
        Polygon((0, 0), (0, 5.871247898), (1.45, 5), (1.45, 0.325), (1.775, 0), align=None)
    revolve(axis=Axis((-70.203187037, -1.321432974, -2.35), (0, 0, 1)), mode=Mode.SUBTRACT)

    # 阵列(圆周)1 copy 8 sketch → 阵列(圆周)1 copy 8 (revolve, cut)
    with BuildSketch(Plane(origin=(-82.651148837, 28.730605226, 4), x_dir=(1, 0, 0), z_dir=(0, -1, 0))):
        Polygon((0, 0), (0, 5.871247898), (1.45, 5), (1.45, 0.325), (1.775, 0), align=None)
    revolve(axis=Axis((-82.651148837, 28.730605226, -2.35), (0, 0, 1)), mode=Mode.SUBTRACT)

    # 阵列(圆周)1 copy 9 sketch → 阵列(圆周)1 copy 9 (revolve, cut)
    with BuildSketch(Plane(origin=(-70.203187037, 58.782643427, 4), x_dir=(0.7071067811865441, -0.7071067811865509, 0), z_dir=(-0.7071067811865509, -0.7071067811865441, 0))):
        Polygon((0, 0), (0, 5.871247898), (1.45, 5), (1.45, 0.325), (1.775, 0), align=None)
    revolve(axis=Axis((-70.203187037, 58.782643427, -2.35), (0, 0, 1)), mode=Mode.SUBTRACT)


solid = part.part
